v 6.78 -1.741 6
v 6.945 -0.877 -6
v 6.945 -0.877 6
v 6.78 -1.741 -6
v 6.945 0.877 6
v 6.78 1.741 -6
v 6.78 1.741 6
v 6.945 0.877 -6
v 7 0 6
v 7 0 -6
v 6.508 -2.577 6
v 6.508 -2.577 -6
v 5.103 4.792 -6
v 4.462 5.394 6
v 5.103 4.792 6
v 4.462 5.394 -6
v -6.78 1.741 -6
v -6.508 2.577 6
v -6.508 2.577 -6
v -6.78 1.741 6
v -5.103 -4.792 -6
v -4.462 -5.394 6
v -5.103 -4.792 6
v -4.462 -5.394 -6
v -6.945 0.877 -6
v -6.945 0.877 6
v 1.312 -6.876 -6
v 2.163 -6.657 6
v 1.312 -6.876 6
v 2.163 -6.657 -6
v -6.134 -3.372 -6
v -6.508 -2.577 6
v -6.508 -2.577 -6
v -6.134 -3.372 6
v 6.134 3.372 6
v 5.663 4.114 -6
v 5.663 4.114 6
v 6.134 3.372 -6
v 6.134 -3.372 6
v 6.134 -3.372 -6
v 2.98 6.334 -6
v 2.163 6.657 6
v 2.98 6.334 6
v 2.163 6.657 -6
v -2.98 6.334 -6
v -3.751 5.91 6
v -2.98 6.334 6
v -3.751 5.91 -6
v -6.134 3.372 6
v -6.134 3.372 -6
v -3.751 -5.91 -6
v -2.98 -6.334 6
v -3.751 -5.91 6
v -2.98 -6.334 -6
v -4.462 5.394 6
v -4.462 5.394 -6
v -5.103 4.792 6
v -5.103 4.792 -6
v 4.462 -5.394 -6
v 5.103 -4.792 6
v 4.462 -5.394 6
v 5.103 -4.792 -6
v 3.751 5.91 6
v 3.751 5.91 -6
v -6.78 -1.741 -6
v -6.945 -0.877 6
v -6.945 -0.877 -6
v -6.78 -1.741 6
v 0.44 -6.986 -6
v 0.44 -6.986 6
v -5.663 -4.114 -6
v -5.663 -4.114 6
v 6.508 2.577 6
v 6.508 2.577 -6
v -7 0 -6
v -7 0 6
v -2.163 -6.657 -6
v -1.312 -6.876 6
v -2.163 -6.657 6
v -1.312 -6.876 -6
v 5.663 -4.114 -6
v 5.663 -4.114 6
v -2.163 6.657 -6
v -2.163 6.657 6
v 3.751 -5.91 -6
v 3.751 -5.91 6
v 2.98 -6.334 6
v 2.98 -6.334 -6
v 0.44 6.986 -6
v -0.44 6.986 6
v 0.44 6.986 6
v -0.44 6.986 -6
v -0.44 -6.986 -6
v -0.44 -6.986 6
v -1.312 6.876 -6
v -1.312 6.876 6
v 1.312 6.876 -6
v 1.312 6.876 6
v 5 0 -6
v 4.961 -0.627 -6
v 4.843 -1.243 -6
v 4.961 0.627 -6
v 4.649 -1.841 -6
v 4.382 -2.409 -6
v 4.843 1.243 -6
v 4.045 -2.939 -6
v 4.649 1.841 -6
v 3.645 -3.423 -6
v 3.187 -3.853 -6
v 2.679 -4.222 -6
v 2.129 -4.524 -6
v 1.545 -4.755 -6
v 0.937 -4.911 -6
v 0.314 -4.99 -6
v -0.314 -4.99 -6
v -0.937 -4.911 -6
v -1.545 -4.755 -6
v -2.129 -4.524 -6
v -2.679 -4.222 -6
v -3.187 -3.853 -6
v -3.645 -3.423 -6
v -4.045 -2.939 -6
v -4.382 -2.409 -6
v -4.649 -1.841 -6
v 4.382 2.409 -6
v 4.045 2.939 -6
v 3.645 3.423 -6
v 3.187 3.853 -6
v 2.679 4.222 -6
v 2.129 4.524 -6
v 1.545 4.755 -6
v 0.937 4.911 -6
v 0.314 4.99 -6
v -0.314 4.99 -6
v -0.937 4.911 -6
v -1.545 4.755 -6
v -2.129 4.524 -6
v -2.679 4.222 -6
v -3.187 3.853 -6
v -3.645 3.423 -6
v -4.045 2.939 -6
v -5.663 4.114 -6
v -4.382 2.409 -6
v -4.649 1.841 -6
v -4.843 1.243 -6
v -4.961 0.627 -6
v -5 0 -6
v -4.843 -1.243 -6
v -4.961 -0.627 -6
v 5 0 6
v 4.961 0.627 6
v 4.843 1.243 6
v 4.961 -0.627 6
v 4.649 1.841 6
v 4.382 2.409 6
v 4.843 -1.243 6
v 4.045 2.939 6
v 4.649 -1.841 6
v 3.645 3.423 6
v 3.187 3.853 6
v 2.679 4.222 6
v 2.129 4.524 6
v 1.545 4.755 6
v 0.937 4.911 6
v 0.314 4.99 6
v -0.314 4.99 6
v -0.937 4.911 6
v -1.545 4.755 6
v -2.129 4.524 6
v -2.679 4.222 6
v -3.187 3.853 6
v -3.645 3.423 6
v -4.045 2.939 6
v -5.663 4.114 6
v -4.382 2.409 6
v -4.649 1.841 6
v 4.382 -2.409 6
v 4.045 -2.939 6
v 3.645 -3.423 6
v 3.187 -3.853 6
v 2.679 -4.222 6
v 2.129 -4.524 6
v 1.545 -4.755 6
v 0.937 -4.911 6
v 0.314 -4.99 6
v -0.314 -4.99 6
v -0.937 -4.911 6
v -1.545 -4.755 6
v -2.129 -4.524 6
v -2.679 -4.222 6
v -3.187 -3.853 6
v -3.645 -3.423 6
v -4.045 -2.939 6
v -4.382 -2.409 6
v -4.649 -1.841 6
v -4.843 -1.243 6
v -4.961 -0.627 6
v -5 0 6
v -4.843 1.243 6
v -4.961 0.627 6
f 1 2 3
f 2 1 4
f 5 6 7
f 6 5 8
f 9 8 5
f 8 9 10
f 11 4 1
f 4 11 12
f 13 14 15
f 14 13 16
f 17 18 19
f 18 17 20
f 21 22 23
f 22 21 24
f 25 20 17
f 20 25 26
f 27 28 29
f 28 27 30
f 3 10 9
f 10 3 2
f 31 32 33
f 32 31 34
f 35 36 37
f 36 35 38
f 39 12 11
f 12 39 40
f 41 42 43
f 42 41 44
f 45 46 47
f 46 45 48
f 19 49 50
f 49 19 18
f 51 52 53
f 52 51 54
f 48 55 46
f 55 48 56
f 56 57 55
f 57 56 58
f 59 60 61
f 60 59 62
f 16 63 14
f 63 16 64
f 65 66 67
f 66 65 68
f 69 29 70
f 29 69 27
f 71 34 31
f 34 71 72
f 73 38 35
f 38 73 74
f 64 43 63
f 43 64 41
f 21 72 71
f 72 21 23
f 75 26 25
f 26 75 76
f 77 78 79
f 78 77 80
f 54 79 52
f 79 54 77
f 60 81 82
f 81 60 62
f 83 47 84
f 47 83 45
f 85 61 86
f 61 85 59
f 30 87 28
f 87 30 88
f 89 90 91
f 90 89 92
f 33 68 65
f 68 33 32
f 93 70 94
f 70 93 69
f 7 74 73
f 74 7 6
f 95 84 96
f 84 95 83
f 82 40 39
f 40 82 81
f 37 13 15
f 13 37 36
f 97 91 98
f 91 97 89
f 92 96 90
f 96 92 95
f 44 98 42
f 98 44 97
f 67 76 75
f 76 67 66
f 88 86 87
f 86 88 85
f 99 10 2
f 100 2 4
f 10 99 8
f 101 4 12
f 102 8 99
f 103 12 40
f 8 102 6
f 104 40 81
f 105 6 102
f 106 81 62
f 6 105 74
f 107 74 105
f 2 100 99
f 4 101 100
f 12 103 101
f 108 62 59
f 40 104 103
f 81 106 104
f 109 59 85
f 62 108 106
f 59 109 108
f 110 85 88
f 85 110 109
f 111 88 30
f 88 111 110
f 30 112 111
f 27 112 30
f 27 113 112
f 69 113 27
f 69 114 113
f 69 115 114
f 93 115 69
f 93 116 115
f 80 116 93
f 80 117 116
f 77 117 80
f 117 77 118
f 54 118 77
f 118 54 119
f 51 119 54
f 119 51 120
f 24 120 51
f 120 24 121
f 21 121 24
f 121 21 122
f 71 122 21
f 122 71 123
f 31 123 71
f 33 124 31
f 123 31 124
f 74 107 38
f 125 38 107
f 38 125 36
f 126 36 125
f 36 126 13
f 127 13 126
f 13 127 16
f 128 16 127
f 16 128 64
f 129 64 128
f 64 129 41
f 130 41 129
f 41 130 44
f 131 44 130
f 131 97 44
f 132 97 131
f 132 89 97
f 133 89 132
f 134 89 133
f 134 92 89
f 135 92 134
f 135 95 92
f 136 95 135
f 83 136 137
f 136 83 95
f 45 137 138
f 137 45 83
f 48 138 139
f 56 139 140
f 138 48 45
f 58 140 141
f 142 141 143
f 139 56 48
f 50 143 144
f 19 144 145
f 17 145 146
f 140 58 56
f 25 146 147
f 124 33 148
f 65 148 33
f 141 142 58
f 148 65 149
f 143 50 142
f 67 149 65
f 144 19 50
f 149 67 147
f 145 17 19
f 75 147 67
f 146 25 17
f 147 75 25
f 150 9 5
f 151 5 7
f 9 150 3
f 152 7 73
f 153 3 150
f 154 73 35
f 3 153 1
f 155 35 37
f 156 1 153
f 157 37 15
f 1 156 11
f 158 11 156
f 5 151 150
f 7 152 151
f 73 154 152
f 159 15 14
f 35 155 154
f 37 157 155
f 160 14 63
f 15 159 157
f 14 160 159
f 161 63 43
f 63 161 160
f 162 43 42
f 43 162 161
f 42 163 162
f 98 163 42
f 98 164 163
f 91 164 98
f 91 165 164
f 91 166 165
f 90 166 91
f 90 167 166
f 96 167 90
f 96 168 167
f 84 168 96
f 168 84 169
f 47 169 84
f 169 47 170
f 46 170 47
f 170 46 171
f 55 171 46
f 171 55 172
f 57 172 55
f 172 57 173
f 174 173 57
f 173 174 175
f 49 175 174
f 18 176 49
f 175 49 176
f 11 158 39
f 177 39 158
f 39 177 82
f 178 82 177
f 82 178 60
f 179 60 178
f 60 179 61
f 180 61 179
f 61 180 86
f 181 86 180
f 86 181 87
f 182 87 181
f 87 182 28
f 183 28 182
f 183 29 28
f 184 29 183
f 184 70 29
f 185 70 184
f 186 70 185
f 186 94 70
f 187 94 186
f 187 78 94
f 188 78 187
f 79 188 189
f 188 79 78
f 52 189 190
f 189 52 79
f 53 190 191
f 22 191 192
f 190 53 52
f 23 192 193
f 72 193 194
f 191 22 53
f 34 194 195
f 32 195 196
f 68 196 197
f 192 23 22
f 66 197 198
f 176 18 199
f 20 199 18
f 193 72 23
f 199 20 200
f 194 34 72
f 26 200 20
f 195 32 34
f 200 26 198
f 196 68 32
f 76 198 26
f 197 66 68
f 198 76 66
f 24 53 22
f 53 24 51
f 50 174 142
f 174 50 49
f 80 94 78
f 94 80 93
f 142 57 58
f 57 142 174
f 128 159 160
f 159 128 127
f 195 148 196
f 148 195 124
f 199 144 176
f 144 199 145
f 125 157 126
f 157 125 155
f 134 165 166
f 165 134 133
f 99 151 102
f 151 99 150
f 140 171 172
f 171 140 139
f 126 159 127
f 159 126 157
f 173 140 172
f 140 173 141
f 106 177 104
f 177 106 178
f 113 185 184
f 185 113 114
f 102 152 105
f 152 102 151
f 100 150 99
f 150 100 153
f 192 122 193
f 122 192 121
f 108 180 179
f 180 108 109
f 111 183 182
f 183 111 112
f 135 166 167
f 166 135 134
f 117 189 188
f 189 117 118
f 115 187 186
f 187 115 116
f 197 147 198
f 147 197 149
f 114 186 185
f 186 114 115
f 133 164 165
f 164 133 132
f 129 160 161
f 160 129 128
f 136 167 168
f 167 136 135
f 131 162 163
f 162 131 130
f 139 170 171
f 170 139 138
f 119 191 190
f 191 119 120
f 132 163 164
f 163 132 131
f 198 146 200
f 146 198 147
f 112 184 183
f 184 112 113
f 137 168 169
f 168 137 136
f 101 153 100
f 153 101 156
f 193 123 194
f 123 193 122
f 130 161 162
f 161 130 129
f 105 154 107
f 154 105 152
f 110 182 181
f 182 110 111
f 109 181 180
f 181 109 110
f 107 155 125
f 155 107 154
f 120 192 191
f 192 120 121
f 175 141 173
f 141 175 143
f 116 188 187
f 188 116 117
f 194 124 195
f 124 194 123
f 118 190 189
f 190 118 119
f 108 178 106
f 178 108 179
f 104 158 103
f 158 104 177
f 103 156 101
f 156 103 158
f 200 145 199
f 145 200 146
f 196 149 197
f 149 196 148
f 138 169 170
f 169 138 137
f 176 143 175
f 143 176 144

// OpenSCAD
$fn = 50;


difference() {
	union() {
		translate(v = [0, 0, -6.0000000000]) {
			cylinder(h = 12, r = 7.0000000000);
		}
	}
	union() {
		translate(v = [0, 0, -100.0000000000]) {
			cylinder(h = 200, r = 5.0000000000);
		}
	}
}
